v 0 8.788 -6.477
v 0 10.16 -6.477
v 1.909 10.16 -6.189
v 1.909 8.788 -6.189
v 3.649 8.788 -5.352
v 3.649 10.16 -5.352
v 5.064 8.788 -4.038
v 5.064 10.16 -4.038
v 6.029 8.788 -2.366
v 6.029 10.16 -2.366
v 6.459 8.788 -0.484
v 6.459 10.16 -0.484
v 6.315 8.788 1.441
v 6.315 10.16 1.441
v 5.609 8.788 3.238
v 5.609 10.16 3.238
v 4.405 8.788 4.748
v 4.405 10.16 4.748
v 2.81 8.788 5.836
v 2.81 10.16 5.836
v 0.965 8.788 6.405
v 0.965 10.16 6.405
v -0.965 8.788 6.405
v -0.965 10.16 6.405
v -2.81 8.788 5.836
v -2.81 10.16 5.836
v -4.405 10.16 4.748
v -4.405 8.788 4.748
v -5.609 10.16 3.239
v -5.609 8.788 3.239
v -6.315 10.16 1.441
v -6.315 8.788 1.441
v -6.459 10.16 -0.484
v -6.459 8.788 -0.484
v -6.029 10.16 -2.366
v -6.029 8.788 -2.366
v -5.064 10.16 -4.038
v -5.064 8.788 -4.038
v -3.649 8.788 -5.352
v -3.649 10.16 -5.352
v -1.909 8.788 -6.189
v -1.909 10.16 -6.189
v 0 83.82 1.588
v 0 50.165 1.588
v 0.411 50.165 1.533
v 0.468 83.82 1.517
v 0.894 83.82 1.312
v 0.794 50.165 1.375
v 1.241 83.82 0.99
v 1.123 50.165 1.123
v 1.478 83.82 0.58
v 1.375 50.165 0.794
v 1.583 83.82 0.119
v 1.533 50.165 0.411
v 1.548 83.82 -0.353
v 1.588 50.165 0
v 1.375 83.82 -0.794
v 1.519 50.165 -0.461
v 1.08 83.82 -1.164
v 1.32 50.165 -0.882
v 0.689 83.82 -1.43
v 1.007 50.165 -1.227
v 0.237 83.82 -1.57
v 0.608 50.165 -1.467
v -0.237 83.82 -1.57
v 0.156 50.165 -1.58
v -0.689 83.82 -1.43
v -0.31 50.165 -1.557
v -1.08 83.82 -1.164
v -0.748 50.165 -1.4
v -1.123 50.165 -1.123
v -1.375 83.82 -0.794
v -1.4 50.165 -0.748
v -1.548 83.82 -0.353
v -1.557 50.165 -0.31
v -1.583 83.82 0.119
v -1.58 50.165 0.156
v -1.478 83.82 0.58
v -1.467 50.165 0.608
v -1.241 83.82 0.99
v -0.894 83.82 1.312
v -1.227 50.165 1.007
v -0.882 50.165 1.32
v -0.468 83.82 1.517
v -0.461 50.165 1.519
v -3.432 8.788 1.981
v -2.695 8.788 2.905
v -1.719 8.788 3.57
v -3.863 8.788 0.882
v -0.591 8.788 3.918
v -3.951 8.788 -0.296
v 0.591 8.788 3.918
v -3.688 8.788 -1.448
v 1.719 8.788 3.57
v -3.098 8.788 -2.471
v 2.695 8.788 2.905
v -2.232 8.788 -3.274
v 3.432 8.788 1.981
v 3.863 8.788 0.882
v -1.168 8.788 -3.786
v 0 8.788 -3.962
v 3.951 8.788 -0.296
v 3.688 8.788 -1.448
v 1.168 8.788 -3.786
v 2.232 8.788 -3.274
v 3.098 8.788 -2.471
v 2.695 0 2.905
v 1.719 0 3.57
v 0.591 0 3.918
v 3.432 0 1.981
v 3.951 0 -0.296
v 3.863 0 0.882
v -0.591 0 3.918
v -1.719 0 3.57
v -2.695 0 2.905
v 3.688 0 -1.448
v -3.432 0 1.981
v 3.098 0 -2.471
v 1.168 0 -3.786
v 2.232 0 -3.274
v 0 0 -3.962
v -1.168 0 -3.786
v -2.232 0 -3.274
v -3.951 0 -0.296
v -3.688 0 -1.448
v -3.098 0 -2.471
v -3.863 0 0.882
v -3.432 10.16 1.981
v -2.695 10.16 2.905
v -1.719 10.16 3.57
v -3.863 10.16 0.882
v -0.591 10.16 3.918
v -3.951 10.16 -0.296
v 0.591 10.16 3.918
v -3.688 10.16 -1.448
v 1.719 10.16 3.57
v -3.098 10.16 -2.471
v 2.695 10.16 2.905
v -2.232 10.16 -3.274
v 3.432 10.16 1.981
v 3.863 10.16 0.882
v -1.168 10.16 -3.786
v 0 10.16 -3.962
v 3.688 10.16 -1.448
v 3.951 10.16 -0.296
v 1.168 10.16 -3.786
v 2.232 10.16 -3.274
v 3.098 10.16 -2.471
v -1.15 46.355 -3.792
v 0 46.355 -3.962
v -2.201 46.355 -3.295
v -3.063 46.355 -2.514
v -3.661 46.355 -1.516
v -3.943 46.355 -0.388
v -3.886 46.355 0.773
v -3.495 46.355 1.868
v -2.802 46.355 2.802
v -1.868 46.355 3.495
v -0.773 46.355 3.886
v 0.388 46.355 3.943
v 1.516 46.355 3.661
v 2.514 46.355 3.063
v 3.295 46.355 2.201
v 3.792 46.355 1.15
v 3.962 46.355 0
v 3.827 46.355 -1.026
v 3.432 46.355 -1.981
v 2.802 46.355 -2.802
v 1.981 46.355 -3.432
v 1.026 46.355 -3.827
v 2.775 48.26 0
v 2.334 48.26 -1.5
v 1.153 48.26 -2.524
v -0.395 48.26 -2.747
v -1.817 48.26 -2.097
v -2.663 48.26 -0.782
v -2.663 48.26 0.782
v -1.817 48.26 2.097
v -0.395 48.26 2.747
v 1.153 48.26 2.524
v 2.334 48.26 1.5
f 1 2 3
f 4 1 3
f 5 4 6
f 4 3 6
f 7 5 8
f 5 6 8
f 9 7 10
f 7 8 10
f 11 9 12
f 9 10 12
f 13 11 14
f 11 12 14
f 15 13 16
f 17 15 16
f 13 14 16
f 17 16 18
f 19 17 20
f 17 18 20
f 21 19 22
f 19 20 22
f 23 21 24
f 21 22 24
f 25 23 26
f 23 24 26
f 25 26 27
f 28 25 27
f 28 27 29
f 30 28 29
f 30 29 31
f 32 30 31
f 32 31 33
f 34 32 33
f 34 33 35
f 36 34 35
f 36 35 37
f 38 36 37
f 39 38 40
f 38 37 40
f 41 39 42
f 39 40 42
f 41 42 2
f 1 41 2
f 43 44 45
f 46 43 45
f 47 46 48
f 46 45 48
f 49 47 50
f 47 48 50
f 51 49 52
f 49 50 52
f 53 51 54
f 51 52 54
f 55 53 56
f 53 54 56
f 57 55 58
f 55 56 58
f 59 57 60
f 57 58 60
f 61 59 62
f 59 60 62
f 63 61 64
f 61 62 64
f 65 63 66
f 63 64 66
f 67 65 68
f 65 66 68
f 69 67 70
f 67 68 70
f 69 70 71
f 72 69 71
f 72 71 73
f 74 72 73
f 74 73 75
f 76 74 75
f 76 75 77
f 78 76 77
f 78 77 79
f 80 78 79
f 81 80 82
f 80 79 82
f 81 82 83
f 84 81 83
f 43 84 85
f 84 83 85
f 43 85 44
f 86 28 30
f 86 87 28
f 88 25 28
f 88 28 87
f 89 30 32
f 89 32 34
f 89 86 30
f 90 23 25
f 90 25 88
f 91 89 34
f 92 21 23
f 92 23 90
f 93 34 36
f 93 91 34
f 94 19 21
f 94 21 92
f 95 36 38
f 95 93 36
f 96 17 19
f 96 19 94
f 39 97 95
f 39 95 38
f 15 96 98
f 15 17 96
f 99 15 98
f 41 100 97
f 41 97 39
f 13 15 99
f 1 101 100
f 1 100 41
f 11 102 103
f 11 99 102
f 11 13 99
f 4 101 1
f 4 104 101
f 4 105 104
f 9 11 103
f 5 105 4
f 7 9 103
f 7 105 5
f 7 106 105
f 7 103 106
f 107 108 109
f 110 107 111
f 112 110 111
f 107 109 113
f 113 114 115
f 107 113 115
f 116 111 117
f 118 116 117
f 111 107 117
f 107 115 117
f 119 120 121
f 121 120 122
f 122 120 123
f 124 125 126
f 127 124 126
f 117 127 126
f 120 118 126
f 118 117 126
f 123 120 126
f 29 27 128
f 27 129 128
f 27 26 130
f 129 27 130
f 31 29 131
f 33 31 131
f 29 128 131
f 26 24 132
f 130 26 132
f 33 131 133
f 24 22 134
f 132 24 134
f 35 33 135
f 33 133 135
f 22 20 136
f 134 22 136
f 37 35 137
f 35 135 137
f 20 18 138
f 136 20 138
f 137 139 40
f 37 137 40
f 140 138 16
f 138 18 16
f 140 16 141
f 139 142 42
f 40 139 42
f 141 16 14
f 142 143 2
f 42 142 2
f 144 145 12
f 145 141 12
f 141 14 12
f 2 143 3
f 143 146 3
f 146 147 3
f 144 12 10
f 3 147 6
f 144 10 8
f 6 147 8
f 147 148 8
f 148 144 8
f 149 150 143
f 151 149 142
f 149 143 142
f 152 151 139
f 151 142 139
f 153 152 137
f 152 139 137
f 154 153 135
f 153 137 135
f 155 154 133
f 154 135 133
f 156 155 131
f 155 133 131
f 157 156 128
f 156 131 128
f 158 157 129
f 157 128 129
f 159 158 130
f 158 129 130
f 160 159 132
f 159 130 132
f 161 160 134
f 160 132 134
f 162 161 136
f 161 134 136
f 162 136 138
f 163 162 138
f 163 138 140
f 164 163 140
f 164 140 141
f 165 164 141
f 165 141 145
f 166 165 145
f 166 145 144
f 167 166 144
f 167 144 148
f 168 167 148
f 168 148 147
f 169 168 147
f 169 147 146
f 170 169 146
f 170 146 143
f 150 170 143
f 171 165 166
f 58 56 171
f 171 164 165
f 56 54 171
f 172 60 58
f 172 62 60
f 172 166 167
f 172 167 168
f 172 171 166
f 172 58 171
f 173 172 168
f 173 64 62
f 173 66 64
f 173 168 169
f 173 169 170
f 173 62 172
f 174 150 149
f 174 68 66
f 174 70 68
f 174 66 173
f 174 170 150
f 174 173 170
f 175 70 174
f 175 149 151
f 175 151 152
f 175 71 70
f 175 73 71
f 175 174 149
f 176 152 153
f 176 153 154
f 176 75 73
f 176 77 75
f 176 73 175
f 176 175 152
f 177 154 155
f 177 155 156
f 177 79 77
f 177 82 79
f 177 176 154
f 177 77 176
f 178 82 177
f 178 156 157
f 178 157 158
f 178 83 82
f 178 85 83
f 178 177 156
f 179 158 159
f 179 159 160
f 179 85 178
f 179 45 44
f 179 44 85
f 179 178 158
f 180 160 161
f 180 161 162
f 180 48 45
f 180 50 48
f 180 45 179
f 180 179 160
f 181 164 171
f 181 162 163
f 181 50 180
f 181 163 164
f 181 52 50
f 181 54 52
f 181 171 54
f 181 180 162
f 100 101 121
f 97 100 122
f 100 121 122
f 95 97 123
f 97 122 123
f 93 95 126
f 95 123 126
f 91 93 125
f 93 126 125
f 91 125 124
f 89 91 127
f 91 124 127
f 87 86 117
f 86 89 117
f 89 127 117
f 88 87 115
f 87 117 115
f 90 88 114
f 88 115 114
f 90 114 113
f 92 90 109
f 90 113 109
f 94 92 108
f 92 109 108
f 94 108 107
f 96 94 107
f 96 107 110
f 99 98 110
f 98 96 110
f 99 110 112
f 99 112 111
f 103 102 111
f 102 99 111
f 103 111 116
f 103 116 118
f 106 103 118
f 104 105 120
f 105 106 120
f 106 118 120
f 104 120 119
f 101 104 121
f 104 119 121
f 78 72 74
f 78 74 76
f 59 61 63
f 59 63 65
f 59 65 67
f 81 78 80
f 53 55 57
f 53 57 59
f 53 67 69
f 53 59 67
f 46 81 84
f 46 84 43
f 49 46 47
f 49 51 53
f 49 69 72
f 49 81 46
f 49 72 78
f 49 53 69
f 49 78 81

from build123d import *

# Parameters (mm, degrees)
SKETCH1_R           = 3.9624
BOSS_EXTRUDE1_DEPTH = 46.355
SKETCH3_R           = 3.9624
SKETCH2_R           = 1.5875
SKETCH4_R           = 1.5875
BOSS_EXTRUDE2_DEPTH = 33.655
SKETCH5_R           = 6.477
BOSS_EXTRUDE3_DEPTH = 1.3716


with BuildPart() as part:
    # Sketch1 → Boss-Extrude1 (new body)
    with BuildSketch(Plane(origin=(0, 0, 0), x_dir=(1, 0, 0), z_dir=(0, 1, 0))):
        with Locations(Location((0, 0, 0), (0, 0, 90))):
            Circle(SKETCH1_R)
    extrude(amount=BOSS_EXTRUDE1_DEPTH)

    # Sketch3 → Loft1 section 0
    with BuildSketch(Plane(origin=(0, 46.355, 0), x_dir=(1, 0, 0), z_dir=(0, 1, 0))):
        Circle(SKETCH3_R)
    # Sketch2 → Loft1 section 1
    with BuildSketch(Plane(origin=(0, 50.165, 0), x_dir=(1, 0, 0), z_dir=(0, 1, 0))):
        Circle(SKETCH2_R)
    loft()

    # Sketch4 → Boss-Extrude2 (add)
    with BuildSketch(Plane(origin=(0, 50.165, 0), x_dir=(1, 0, 0), z_dir=(0, 1, 0))):
        with Locations(Location((0, 0, 0), (0, 0, 270))):
            Circle(SKETCH4_R)
    extrude(amount=BOSS_EXTRUDE2_DEPTH)

    # Sketch5 → Boss-Extrude3 (add)
    with BuildSketch(Plane(origin=(0, 10.16, 0), x_dir=(-1, 0, 0), z_dir=(0, -1, 0))):
        with Locations(Location((0, 0, 0), (0, 0, 90))):
            Circle(SKETCH5_R)
    extrude(amount=BOSS_EXTRUDE3_DEPTH)


solid = part.part
